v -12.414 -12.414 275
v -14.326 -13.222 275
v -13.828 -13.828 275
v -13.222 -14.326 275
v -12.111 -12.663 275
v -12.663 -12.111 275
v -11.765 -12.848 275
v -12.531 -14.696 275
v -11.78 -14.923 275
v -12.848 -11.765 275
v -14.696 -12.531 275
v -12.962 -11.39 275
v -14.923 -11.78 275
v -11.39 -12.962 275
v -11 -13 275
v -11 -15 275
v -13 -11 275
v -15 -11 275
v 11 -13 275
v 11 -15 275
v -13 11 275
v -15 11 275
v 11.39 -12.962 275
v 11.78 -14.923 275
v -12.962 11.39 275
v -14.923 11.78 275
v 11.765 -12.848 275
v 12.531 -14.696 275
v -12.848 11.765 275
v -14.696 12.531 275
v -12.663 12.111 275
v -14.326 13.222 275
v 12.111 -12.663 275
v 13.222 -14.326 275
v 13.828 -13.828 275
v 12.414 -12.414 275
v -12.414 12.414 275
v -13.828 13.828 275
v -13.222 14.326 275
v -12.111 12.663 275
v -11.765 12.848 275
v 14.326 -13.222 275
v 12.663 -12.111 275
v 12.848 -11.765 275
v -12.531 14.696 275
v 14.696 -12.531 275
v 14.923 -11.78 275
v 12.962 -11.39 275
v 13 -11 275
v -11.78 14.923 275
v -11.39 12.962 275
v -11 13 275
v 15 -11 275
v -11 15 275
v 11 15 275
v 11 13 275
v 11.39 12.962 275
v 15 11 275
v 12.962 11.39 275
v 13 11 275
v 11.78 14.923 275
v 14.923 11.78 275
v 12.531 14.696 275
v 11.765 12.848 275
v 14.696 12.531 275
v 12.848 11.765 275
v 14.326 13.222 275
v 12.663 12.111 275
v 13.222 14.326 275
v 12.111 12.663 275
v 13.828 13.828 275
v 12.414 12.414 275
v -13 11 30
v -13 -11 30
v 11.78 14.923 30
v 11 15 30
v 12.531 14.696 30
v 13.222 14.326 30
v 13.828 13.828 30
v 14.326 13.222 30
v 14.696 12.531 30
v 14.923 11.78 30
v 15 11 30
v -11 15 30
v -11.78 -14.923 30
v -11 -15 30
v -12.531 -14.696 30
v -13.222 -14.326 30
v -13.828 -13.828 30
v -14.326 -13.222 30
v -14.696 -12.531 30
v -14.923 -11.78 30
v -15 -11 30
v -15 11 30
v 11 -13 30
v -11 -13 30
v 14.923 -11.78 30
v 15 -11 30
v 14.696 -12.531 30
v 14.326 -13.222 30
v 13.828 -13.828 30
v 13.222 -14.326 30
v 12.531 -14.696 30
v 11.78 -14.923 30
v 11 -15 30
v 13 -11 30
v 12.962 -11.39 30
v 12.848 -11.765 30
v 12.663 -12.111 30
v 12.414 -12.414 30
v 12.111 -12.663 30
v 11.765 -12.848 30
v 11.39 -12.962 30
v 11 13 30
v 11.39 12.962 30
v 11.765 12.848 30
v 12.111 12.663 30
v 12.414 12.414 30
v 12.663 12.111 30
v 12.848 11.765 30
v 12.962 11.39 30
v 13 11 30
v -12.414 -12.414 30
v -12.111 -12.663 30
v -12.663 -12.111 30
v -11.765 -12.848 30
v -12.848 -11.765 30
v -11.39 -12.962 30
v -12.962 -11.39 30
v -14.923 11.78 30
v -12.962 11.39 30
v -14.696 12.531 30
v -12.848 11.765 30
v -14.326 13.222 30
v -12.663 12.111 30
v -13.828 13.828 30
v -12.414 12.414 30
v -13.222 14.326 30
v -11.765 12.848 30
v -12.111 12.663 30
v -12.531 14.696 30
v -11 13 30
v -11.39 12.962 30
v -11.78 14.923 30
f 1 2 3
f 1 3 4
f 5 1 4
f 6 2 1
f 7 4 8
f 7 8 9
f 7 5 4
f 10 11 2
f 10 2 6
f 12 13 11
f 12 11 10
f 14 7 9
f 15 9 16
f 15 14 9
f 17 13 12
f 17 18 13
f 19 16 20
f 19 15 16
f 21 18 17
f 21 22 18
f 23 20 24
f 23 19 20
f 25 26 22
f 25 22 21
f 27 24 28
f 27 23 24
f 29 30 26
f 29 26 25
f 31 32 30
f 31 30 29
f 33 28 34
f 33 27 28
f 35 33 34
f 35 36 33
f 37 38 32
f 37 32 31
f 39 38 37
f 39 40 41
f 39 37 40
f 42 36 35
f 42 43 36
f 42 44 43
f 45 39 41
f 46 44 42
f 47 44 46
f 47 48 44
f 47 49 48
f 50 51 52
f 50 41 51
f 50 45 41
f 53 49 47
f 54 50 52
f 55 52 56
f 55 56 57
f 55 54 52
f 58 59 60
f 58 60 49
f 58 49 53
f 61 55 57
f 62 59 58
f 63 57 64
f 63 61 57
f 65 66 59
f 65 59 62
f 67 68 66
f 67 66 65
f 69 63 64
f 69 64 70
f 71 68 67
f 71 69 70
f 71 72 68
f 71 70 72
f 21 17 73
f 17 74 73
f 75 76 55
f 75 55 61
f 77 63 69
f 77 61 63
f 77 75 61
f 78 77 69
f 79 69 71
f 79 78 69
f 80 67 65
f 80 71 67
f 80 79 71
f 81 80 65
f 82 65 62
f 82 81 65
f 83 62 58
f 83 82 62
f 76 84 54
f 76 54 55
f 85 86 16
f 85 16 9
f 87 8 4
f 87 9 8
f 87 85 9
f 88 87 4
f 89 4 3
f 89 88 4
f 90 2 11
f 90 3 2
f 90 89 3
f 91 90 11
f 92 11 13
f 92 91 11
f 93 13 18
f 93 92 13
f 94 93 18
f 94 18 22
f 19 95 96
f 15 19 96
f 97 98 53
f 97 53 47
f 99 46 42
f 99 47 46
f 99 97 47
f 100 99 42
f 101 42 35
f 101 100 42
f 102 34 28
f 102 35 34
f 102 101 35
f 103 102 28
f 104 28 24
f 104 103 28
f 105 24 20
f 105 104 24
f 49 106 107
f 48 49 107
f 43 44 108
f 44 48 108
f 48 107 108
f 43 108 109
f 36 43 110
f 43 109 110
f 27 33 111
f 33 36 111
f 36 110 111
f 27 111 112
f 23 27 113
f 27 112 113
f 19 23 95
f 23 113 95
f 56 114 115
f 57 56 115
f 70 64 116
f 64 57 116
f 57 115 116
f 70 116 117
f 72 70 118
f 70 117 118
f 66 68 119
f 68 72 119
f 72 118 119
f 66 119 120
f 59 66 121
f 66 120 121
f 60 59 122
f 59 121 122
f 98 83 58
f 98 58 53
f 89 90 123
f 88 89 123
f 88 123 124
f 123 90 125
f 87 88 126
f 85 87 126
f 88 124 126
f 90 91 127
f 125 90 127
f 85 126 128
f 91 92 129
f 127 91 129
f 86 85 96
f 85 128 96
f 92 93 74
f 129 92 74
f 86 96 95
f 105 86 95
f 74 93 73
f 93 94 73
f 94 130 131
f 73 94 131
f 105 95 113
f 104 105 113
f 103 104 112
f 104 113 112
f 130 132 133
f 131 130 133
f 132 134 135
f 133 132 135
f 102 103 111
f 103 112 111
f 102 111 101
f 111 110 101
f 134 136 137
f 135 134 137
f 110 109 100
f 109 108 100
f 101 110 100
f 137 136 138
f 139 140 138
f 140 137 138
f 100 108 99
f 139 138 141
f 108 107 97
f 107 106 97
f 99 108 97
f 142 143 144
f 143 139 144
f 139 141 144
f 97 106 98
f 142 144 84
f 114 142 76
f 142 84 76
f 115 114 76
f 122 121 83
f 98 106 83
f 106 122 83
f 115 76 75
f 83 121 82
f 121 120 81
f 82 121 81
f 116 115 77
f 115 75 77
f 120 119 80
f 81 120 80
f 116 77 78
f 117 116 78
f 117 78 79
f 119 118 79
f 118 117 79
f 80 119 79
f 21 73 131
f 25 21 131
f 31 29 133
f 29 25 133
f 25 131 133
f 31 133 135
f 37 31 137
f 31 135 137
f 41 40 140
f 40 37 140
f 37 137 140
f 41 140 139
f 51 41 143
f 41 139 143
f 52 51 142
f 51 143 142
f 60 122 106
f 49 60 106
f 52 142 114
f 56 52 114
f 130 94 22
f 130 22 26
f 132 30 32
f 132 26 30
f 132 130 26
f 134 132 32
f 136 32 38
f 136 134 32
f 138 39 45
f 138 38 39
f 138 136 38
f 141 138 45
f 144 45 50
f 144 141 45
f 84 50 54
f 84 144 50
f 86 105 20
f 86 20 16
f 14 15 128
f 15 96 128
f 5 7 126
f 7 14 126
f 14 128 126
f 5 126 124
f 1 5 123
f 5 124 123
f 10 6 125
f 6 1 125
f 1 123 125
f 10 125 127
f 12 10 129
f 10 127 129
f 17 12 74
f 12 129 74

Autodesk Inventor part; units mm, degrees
ref_plane "Plano inicial" through (0, 0, 30) normal (0, 0, 1) x (1, 0, 0)
ref_plane "Plano final" through (0, 0, 275) normal (0, 0, 1) x (1, 0, 0)
sketch "Esboço" plane through (0, 0, 0) normal (0, 0, 1) x (1, 0, 0)
  line L0 (-15, -11) -> (-15, 11)
  line L1 (-11, 15) -> (11, 15)
  line L2 (15, 11) -> (15, -11)
  line L3 (11, -15) -> (-11, -15)
  arc A0 (-15, -11) -> (-11, -15) centre (-11, -11) ccw
  arc A1 (15, 11) -> (11, 15) centre (11, 11) ccw
  arc A2 (-11, 15) -> (-15, 11) centre (-11, 11) ccw
  arc A3 (11, -15) -> (15, -11) centre (11, -11) ccw
  arc A4 (-11, 13) -> (-13, 11) centre (-11, 11) ccw
  line L4 (-11, 13) -> (11, 13)
  arc A5 (13, 11) -> (11, 13) centre (11, 11) ccw
  line L5 (13, 11) -> (13, -11)
  arc A6 (11, -13) -> (13, -11) centre (11, -11) ccw
  line L6 (11, -13) -> (-11, -13)
  arc A7 (-13, -11) -> (-11, -13) centre (-11, -11) ccw
  line L7 (-13, -11) -> (-13, 11)
  line L8 (0, 22.1598) -> (0, -22.1598) construction
  line L9 (-22.1598, 0) -> (22.1598, 0) construction
  dimension "d7" = 4
  dimension "d9" = 30
  dimension "d11" = 30
  dimension "d12" = 2
  dimension "d15" = 15
  dimension "d16" = 15
extrude "Corpo" add sketch "Esboço" along normal up to surface (245 mm away) from surface at 30
sketch "Sketch3" plane through (0, 0, 0) normal (0, 0, 1) x (1, 0, 0)
  line L0 (0, 0) -> (10, 0)
ref_plane "Work Plane3" through (0, 0, 0) normal (0, -1, 0) x (1, 0, 0)
sketch "Sketch4" plane through (0, 0, 0) normal (0, -1, 0) x (1, 0, 0)
  line L0 (-2, 30) -> (12, 30)
  line L1 (-2, 275) -> (12, 275)
  dimension "d18" = 245
ref_plane "Plano de trabalho4" through (218, 11, 30) normal (0, 0, -1) x (-1, 0, 0)
split "Dividir1" plane through (218, 11, 30) removes the side toward (0, 0, -1)
ref_plane "Plano de trabalho5" through (-332, 11, 275) normal (0, 0, 1) x (1, 0, 0)
split "Dividir2" plane through (-332, 11, 275) removes the side toward (0, 0, 1)
equation "\"d7\" = G_IR"
equation "\"d9\" = G_W"
equation "\"d11\" = G_H"
equation "\"d12\" = G_T"
equation "\"d15\" = 0.5 * d9"
equation "\"d16\" = 0.5 * d11"
equation "\"d3\" = G_L"
equation "\"G_W\" = 30"
equation "\"G_H\" = 30"
equation "\"G_T\" = 2"
equation "\"G_IR\" = 4"
equation "\"G_L\" = d18"
equation "\"G_OFFSET_END\" = 0"
equation "\"d14\" = G_OFFSET_END + B_L"
equation "\"B_L\" = 275"
properties part number "ISO 10799-2 - 30x30x2 - 245" material "Aço, suave"
